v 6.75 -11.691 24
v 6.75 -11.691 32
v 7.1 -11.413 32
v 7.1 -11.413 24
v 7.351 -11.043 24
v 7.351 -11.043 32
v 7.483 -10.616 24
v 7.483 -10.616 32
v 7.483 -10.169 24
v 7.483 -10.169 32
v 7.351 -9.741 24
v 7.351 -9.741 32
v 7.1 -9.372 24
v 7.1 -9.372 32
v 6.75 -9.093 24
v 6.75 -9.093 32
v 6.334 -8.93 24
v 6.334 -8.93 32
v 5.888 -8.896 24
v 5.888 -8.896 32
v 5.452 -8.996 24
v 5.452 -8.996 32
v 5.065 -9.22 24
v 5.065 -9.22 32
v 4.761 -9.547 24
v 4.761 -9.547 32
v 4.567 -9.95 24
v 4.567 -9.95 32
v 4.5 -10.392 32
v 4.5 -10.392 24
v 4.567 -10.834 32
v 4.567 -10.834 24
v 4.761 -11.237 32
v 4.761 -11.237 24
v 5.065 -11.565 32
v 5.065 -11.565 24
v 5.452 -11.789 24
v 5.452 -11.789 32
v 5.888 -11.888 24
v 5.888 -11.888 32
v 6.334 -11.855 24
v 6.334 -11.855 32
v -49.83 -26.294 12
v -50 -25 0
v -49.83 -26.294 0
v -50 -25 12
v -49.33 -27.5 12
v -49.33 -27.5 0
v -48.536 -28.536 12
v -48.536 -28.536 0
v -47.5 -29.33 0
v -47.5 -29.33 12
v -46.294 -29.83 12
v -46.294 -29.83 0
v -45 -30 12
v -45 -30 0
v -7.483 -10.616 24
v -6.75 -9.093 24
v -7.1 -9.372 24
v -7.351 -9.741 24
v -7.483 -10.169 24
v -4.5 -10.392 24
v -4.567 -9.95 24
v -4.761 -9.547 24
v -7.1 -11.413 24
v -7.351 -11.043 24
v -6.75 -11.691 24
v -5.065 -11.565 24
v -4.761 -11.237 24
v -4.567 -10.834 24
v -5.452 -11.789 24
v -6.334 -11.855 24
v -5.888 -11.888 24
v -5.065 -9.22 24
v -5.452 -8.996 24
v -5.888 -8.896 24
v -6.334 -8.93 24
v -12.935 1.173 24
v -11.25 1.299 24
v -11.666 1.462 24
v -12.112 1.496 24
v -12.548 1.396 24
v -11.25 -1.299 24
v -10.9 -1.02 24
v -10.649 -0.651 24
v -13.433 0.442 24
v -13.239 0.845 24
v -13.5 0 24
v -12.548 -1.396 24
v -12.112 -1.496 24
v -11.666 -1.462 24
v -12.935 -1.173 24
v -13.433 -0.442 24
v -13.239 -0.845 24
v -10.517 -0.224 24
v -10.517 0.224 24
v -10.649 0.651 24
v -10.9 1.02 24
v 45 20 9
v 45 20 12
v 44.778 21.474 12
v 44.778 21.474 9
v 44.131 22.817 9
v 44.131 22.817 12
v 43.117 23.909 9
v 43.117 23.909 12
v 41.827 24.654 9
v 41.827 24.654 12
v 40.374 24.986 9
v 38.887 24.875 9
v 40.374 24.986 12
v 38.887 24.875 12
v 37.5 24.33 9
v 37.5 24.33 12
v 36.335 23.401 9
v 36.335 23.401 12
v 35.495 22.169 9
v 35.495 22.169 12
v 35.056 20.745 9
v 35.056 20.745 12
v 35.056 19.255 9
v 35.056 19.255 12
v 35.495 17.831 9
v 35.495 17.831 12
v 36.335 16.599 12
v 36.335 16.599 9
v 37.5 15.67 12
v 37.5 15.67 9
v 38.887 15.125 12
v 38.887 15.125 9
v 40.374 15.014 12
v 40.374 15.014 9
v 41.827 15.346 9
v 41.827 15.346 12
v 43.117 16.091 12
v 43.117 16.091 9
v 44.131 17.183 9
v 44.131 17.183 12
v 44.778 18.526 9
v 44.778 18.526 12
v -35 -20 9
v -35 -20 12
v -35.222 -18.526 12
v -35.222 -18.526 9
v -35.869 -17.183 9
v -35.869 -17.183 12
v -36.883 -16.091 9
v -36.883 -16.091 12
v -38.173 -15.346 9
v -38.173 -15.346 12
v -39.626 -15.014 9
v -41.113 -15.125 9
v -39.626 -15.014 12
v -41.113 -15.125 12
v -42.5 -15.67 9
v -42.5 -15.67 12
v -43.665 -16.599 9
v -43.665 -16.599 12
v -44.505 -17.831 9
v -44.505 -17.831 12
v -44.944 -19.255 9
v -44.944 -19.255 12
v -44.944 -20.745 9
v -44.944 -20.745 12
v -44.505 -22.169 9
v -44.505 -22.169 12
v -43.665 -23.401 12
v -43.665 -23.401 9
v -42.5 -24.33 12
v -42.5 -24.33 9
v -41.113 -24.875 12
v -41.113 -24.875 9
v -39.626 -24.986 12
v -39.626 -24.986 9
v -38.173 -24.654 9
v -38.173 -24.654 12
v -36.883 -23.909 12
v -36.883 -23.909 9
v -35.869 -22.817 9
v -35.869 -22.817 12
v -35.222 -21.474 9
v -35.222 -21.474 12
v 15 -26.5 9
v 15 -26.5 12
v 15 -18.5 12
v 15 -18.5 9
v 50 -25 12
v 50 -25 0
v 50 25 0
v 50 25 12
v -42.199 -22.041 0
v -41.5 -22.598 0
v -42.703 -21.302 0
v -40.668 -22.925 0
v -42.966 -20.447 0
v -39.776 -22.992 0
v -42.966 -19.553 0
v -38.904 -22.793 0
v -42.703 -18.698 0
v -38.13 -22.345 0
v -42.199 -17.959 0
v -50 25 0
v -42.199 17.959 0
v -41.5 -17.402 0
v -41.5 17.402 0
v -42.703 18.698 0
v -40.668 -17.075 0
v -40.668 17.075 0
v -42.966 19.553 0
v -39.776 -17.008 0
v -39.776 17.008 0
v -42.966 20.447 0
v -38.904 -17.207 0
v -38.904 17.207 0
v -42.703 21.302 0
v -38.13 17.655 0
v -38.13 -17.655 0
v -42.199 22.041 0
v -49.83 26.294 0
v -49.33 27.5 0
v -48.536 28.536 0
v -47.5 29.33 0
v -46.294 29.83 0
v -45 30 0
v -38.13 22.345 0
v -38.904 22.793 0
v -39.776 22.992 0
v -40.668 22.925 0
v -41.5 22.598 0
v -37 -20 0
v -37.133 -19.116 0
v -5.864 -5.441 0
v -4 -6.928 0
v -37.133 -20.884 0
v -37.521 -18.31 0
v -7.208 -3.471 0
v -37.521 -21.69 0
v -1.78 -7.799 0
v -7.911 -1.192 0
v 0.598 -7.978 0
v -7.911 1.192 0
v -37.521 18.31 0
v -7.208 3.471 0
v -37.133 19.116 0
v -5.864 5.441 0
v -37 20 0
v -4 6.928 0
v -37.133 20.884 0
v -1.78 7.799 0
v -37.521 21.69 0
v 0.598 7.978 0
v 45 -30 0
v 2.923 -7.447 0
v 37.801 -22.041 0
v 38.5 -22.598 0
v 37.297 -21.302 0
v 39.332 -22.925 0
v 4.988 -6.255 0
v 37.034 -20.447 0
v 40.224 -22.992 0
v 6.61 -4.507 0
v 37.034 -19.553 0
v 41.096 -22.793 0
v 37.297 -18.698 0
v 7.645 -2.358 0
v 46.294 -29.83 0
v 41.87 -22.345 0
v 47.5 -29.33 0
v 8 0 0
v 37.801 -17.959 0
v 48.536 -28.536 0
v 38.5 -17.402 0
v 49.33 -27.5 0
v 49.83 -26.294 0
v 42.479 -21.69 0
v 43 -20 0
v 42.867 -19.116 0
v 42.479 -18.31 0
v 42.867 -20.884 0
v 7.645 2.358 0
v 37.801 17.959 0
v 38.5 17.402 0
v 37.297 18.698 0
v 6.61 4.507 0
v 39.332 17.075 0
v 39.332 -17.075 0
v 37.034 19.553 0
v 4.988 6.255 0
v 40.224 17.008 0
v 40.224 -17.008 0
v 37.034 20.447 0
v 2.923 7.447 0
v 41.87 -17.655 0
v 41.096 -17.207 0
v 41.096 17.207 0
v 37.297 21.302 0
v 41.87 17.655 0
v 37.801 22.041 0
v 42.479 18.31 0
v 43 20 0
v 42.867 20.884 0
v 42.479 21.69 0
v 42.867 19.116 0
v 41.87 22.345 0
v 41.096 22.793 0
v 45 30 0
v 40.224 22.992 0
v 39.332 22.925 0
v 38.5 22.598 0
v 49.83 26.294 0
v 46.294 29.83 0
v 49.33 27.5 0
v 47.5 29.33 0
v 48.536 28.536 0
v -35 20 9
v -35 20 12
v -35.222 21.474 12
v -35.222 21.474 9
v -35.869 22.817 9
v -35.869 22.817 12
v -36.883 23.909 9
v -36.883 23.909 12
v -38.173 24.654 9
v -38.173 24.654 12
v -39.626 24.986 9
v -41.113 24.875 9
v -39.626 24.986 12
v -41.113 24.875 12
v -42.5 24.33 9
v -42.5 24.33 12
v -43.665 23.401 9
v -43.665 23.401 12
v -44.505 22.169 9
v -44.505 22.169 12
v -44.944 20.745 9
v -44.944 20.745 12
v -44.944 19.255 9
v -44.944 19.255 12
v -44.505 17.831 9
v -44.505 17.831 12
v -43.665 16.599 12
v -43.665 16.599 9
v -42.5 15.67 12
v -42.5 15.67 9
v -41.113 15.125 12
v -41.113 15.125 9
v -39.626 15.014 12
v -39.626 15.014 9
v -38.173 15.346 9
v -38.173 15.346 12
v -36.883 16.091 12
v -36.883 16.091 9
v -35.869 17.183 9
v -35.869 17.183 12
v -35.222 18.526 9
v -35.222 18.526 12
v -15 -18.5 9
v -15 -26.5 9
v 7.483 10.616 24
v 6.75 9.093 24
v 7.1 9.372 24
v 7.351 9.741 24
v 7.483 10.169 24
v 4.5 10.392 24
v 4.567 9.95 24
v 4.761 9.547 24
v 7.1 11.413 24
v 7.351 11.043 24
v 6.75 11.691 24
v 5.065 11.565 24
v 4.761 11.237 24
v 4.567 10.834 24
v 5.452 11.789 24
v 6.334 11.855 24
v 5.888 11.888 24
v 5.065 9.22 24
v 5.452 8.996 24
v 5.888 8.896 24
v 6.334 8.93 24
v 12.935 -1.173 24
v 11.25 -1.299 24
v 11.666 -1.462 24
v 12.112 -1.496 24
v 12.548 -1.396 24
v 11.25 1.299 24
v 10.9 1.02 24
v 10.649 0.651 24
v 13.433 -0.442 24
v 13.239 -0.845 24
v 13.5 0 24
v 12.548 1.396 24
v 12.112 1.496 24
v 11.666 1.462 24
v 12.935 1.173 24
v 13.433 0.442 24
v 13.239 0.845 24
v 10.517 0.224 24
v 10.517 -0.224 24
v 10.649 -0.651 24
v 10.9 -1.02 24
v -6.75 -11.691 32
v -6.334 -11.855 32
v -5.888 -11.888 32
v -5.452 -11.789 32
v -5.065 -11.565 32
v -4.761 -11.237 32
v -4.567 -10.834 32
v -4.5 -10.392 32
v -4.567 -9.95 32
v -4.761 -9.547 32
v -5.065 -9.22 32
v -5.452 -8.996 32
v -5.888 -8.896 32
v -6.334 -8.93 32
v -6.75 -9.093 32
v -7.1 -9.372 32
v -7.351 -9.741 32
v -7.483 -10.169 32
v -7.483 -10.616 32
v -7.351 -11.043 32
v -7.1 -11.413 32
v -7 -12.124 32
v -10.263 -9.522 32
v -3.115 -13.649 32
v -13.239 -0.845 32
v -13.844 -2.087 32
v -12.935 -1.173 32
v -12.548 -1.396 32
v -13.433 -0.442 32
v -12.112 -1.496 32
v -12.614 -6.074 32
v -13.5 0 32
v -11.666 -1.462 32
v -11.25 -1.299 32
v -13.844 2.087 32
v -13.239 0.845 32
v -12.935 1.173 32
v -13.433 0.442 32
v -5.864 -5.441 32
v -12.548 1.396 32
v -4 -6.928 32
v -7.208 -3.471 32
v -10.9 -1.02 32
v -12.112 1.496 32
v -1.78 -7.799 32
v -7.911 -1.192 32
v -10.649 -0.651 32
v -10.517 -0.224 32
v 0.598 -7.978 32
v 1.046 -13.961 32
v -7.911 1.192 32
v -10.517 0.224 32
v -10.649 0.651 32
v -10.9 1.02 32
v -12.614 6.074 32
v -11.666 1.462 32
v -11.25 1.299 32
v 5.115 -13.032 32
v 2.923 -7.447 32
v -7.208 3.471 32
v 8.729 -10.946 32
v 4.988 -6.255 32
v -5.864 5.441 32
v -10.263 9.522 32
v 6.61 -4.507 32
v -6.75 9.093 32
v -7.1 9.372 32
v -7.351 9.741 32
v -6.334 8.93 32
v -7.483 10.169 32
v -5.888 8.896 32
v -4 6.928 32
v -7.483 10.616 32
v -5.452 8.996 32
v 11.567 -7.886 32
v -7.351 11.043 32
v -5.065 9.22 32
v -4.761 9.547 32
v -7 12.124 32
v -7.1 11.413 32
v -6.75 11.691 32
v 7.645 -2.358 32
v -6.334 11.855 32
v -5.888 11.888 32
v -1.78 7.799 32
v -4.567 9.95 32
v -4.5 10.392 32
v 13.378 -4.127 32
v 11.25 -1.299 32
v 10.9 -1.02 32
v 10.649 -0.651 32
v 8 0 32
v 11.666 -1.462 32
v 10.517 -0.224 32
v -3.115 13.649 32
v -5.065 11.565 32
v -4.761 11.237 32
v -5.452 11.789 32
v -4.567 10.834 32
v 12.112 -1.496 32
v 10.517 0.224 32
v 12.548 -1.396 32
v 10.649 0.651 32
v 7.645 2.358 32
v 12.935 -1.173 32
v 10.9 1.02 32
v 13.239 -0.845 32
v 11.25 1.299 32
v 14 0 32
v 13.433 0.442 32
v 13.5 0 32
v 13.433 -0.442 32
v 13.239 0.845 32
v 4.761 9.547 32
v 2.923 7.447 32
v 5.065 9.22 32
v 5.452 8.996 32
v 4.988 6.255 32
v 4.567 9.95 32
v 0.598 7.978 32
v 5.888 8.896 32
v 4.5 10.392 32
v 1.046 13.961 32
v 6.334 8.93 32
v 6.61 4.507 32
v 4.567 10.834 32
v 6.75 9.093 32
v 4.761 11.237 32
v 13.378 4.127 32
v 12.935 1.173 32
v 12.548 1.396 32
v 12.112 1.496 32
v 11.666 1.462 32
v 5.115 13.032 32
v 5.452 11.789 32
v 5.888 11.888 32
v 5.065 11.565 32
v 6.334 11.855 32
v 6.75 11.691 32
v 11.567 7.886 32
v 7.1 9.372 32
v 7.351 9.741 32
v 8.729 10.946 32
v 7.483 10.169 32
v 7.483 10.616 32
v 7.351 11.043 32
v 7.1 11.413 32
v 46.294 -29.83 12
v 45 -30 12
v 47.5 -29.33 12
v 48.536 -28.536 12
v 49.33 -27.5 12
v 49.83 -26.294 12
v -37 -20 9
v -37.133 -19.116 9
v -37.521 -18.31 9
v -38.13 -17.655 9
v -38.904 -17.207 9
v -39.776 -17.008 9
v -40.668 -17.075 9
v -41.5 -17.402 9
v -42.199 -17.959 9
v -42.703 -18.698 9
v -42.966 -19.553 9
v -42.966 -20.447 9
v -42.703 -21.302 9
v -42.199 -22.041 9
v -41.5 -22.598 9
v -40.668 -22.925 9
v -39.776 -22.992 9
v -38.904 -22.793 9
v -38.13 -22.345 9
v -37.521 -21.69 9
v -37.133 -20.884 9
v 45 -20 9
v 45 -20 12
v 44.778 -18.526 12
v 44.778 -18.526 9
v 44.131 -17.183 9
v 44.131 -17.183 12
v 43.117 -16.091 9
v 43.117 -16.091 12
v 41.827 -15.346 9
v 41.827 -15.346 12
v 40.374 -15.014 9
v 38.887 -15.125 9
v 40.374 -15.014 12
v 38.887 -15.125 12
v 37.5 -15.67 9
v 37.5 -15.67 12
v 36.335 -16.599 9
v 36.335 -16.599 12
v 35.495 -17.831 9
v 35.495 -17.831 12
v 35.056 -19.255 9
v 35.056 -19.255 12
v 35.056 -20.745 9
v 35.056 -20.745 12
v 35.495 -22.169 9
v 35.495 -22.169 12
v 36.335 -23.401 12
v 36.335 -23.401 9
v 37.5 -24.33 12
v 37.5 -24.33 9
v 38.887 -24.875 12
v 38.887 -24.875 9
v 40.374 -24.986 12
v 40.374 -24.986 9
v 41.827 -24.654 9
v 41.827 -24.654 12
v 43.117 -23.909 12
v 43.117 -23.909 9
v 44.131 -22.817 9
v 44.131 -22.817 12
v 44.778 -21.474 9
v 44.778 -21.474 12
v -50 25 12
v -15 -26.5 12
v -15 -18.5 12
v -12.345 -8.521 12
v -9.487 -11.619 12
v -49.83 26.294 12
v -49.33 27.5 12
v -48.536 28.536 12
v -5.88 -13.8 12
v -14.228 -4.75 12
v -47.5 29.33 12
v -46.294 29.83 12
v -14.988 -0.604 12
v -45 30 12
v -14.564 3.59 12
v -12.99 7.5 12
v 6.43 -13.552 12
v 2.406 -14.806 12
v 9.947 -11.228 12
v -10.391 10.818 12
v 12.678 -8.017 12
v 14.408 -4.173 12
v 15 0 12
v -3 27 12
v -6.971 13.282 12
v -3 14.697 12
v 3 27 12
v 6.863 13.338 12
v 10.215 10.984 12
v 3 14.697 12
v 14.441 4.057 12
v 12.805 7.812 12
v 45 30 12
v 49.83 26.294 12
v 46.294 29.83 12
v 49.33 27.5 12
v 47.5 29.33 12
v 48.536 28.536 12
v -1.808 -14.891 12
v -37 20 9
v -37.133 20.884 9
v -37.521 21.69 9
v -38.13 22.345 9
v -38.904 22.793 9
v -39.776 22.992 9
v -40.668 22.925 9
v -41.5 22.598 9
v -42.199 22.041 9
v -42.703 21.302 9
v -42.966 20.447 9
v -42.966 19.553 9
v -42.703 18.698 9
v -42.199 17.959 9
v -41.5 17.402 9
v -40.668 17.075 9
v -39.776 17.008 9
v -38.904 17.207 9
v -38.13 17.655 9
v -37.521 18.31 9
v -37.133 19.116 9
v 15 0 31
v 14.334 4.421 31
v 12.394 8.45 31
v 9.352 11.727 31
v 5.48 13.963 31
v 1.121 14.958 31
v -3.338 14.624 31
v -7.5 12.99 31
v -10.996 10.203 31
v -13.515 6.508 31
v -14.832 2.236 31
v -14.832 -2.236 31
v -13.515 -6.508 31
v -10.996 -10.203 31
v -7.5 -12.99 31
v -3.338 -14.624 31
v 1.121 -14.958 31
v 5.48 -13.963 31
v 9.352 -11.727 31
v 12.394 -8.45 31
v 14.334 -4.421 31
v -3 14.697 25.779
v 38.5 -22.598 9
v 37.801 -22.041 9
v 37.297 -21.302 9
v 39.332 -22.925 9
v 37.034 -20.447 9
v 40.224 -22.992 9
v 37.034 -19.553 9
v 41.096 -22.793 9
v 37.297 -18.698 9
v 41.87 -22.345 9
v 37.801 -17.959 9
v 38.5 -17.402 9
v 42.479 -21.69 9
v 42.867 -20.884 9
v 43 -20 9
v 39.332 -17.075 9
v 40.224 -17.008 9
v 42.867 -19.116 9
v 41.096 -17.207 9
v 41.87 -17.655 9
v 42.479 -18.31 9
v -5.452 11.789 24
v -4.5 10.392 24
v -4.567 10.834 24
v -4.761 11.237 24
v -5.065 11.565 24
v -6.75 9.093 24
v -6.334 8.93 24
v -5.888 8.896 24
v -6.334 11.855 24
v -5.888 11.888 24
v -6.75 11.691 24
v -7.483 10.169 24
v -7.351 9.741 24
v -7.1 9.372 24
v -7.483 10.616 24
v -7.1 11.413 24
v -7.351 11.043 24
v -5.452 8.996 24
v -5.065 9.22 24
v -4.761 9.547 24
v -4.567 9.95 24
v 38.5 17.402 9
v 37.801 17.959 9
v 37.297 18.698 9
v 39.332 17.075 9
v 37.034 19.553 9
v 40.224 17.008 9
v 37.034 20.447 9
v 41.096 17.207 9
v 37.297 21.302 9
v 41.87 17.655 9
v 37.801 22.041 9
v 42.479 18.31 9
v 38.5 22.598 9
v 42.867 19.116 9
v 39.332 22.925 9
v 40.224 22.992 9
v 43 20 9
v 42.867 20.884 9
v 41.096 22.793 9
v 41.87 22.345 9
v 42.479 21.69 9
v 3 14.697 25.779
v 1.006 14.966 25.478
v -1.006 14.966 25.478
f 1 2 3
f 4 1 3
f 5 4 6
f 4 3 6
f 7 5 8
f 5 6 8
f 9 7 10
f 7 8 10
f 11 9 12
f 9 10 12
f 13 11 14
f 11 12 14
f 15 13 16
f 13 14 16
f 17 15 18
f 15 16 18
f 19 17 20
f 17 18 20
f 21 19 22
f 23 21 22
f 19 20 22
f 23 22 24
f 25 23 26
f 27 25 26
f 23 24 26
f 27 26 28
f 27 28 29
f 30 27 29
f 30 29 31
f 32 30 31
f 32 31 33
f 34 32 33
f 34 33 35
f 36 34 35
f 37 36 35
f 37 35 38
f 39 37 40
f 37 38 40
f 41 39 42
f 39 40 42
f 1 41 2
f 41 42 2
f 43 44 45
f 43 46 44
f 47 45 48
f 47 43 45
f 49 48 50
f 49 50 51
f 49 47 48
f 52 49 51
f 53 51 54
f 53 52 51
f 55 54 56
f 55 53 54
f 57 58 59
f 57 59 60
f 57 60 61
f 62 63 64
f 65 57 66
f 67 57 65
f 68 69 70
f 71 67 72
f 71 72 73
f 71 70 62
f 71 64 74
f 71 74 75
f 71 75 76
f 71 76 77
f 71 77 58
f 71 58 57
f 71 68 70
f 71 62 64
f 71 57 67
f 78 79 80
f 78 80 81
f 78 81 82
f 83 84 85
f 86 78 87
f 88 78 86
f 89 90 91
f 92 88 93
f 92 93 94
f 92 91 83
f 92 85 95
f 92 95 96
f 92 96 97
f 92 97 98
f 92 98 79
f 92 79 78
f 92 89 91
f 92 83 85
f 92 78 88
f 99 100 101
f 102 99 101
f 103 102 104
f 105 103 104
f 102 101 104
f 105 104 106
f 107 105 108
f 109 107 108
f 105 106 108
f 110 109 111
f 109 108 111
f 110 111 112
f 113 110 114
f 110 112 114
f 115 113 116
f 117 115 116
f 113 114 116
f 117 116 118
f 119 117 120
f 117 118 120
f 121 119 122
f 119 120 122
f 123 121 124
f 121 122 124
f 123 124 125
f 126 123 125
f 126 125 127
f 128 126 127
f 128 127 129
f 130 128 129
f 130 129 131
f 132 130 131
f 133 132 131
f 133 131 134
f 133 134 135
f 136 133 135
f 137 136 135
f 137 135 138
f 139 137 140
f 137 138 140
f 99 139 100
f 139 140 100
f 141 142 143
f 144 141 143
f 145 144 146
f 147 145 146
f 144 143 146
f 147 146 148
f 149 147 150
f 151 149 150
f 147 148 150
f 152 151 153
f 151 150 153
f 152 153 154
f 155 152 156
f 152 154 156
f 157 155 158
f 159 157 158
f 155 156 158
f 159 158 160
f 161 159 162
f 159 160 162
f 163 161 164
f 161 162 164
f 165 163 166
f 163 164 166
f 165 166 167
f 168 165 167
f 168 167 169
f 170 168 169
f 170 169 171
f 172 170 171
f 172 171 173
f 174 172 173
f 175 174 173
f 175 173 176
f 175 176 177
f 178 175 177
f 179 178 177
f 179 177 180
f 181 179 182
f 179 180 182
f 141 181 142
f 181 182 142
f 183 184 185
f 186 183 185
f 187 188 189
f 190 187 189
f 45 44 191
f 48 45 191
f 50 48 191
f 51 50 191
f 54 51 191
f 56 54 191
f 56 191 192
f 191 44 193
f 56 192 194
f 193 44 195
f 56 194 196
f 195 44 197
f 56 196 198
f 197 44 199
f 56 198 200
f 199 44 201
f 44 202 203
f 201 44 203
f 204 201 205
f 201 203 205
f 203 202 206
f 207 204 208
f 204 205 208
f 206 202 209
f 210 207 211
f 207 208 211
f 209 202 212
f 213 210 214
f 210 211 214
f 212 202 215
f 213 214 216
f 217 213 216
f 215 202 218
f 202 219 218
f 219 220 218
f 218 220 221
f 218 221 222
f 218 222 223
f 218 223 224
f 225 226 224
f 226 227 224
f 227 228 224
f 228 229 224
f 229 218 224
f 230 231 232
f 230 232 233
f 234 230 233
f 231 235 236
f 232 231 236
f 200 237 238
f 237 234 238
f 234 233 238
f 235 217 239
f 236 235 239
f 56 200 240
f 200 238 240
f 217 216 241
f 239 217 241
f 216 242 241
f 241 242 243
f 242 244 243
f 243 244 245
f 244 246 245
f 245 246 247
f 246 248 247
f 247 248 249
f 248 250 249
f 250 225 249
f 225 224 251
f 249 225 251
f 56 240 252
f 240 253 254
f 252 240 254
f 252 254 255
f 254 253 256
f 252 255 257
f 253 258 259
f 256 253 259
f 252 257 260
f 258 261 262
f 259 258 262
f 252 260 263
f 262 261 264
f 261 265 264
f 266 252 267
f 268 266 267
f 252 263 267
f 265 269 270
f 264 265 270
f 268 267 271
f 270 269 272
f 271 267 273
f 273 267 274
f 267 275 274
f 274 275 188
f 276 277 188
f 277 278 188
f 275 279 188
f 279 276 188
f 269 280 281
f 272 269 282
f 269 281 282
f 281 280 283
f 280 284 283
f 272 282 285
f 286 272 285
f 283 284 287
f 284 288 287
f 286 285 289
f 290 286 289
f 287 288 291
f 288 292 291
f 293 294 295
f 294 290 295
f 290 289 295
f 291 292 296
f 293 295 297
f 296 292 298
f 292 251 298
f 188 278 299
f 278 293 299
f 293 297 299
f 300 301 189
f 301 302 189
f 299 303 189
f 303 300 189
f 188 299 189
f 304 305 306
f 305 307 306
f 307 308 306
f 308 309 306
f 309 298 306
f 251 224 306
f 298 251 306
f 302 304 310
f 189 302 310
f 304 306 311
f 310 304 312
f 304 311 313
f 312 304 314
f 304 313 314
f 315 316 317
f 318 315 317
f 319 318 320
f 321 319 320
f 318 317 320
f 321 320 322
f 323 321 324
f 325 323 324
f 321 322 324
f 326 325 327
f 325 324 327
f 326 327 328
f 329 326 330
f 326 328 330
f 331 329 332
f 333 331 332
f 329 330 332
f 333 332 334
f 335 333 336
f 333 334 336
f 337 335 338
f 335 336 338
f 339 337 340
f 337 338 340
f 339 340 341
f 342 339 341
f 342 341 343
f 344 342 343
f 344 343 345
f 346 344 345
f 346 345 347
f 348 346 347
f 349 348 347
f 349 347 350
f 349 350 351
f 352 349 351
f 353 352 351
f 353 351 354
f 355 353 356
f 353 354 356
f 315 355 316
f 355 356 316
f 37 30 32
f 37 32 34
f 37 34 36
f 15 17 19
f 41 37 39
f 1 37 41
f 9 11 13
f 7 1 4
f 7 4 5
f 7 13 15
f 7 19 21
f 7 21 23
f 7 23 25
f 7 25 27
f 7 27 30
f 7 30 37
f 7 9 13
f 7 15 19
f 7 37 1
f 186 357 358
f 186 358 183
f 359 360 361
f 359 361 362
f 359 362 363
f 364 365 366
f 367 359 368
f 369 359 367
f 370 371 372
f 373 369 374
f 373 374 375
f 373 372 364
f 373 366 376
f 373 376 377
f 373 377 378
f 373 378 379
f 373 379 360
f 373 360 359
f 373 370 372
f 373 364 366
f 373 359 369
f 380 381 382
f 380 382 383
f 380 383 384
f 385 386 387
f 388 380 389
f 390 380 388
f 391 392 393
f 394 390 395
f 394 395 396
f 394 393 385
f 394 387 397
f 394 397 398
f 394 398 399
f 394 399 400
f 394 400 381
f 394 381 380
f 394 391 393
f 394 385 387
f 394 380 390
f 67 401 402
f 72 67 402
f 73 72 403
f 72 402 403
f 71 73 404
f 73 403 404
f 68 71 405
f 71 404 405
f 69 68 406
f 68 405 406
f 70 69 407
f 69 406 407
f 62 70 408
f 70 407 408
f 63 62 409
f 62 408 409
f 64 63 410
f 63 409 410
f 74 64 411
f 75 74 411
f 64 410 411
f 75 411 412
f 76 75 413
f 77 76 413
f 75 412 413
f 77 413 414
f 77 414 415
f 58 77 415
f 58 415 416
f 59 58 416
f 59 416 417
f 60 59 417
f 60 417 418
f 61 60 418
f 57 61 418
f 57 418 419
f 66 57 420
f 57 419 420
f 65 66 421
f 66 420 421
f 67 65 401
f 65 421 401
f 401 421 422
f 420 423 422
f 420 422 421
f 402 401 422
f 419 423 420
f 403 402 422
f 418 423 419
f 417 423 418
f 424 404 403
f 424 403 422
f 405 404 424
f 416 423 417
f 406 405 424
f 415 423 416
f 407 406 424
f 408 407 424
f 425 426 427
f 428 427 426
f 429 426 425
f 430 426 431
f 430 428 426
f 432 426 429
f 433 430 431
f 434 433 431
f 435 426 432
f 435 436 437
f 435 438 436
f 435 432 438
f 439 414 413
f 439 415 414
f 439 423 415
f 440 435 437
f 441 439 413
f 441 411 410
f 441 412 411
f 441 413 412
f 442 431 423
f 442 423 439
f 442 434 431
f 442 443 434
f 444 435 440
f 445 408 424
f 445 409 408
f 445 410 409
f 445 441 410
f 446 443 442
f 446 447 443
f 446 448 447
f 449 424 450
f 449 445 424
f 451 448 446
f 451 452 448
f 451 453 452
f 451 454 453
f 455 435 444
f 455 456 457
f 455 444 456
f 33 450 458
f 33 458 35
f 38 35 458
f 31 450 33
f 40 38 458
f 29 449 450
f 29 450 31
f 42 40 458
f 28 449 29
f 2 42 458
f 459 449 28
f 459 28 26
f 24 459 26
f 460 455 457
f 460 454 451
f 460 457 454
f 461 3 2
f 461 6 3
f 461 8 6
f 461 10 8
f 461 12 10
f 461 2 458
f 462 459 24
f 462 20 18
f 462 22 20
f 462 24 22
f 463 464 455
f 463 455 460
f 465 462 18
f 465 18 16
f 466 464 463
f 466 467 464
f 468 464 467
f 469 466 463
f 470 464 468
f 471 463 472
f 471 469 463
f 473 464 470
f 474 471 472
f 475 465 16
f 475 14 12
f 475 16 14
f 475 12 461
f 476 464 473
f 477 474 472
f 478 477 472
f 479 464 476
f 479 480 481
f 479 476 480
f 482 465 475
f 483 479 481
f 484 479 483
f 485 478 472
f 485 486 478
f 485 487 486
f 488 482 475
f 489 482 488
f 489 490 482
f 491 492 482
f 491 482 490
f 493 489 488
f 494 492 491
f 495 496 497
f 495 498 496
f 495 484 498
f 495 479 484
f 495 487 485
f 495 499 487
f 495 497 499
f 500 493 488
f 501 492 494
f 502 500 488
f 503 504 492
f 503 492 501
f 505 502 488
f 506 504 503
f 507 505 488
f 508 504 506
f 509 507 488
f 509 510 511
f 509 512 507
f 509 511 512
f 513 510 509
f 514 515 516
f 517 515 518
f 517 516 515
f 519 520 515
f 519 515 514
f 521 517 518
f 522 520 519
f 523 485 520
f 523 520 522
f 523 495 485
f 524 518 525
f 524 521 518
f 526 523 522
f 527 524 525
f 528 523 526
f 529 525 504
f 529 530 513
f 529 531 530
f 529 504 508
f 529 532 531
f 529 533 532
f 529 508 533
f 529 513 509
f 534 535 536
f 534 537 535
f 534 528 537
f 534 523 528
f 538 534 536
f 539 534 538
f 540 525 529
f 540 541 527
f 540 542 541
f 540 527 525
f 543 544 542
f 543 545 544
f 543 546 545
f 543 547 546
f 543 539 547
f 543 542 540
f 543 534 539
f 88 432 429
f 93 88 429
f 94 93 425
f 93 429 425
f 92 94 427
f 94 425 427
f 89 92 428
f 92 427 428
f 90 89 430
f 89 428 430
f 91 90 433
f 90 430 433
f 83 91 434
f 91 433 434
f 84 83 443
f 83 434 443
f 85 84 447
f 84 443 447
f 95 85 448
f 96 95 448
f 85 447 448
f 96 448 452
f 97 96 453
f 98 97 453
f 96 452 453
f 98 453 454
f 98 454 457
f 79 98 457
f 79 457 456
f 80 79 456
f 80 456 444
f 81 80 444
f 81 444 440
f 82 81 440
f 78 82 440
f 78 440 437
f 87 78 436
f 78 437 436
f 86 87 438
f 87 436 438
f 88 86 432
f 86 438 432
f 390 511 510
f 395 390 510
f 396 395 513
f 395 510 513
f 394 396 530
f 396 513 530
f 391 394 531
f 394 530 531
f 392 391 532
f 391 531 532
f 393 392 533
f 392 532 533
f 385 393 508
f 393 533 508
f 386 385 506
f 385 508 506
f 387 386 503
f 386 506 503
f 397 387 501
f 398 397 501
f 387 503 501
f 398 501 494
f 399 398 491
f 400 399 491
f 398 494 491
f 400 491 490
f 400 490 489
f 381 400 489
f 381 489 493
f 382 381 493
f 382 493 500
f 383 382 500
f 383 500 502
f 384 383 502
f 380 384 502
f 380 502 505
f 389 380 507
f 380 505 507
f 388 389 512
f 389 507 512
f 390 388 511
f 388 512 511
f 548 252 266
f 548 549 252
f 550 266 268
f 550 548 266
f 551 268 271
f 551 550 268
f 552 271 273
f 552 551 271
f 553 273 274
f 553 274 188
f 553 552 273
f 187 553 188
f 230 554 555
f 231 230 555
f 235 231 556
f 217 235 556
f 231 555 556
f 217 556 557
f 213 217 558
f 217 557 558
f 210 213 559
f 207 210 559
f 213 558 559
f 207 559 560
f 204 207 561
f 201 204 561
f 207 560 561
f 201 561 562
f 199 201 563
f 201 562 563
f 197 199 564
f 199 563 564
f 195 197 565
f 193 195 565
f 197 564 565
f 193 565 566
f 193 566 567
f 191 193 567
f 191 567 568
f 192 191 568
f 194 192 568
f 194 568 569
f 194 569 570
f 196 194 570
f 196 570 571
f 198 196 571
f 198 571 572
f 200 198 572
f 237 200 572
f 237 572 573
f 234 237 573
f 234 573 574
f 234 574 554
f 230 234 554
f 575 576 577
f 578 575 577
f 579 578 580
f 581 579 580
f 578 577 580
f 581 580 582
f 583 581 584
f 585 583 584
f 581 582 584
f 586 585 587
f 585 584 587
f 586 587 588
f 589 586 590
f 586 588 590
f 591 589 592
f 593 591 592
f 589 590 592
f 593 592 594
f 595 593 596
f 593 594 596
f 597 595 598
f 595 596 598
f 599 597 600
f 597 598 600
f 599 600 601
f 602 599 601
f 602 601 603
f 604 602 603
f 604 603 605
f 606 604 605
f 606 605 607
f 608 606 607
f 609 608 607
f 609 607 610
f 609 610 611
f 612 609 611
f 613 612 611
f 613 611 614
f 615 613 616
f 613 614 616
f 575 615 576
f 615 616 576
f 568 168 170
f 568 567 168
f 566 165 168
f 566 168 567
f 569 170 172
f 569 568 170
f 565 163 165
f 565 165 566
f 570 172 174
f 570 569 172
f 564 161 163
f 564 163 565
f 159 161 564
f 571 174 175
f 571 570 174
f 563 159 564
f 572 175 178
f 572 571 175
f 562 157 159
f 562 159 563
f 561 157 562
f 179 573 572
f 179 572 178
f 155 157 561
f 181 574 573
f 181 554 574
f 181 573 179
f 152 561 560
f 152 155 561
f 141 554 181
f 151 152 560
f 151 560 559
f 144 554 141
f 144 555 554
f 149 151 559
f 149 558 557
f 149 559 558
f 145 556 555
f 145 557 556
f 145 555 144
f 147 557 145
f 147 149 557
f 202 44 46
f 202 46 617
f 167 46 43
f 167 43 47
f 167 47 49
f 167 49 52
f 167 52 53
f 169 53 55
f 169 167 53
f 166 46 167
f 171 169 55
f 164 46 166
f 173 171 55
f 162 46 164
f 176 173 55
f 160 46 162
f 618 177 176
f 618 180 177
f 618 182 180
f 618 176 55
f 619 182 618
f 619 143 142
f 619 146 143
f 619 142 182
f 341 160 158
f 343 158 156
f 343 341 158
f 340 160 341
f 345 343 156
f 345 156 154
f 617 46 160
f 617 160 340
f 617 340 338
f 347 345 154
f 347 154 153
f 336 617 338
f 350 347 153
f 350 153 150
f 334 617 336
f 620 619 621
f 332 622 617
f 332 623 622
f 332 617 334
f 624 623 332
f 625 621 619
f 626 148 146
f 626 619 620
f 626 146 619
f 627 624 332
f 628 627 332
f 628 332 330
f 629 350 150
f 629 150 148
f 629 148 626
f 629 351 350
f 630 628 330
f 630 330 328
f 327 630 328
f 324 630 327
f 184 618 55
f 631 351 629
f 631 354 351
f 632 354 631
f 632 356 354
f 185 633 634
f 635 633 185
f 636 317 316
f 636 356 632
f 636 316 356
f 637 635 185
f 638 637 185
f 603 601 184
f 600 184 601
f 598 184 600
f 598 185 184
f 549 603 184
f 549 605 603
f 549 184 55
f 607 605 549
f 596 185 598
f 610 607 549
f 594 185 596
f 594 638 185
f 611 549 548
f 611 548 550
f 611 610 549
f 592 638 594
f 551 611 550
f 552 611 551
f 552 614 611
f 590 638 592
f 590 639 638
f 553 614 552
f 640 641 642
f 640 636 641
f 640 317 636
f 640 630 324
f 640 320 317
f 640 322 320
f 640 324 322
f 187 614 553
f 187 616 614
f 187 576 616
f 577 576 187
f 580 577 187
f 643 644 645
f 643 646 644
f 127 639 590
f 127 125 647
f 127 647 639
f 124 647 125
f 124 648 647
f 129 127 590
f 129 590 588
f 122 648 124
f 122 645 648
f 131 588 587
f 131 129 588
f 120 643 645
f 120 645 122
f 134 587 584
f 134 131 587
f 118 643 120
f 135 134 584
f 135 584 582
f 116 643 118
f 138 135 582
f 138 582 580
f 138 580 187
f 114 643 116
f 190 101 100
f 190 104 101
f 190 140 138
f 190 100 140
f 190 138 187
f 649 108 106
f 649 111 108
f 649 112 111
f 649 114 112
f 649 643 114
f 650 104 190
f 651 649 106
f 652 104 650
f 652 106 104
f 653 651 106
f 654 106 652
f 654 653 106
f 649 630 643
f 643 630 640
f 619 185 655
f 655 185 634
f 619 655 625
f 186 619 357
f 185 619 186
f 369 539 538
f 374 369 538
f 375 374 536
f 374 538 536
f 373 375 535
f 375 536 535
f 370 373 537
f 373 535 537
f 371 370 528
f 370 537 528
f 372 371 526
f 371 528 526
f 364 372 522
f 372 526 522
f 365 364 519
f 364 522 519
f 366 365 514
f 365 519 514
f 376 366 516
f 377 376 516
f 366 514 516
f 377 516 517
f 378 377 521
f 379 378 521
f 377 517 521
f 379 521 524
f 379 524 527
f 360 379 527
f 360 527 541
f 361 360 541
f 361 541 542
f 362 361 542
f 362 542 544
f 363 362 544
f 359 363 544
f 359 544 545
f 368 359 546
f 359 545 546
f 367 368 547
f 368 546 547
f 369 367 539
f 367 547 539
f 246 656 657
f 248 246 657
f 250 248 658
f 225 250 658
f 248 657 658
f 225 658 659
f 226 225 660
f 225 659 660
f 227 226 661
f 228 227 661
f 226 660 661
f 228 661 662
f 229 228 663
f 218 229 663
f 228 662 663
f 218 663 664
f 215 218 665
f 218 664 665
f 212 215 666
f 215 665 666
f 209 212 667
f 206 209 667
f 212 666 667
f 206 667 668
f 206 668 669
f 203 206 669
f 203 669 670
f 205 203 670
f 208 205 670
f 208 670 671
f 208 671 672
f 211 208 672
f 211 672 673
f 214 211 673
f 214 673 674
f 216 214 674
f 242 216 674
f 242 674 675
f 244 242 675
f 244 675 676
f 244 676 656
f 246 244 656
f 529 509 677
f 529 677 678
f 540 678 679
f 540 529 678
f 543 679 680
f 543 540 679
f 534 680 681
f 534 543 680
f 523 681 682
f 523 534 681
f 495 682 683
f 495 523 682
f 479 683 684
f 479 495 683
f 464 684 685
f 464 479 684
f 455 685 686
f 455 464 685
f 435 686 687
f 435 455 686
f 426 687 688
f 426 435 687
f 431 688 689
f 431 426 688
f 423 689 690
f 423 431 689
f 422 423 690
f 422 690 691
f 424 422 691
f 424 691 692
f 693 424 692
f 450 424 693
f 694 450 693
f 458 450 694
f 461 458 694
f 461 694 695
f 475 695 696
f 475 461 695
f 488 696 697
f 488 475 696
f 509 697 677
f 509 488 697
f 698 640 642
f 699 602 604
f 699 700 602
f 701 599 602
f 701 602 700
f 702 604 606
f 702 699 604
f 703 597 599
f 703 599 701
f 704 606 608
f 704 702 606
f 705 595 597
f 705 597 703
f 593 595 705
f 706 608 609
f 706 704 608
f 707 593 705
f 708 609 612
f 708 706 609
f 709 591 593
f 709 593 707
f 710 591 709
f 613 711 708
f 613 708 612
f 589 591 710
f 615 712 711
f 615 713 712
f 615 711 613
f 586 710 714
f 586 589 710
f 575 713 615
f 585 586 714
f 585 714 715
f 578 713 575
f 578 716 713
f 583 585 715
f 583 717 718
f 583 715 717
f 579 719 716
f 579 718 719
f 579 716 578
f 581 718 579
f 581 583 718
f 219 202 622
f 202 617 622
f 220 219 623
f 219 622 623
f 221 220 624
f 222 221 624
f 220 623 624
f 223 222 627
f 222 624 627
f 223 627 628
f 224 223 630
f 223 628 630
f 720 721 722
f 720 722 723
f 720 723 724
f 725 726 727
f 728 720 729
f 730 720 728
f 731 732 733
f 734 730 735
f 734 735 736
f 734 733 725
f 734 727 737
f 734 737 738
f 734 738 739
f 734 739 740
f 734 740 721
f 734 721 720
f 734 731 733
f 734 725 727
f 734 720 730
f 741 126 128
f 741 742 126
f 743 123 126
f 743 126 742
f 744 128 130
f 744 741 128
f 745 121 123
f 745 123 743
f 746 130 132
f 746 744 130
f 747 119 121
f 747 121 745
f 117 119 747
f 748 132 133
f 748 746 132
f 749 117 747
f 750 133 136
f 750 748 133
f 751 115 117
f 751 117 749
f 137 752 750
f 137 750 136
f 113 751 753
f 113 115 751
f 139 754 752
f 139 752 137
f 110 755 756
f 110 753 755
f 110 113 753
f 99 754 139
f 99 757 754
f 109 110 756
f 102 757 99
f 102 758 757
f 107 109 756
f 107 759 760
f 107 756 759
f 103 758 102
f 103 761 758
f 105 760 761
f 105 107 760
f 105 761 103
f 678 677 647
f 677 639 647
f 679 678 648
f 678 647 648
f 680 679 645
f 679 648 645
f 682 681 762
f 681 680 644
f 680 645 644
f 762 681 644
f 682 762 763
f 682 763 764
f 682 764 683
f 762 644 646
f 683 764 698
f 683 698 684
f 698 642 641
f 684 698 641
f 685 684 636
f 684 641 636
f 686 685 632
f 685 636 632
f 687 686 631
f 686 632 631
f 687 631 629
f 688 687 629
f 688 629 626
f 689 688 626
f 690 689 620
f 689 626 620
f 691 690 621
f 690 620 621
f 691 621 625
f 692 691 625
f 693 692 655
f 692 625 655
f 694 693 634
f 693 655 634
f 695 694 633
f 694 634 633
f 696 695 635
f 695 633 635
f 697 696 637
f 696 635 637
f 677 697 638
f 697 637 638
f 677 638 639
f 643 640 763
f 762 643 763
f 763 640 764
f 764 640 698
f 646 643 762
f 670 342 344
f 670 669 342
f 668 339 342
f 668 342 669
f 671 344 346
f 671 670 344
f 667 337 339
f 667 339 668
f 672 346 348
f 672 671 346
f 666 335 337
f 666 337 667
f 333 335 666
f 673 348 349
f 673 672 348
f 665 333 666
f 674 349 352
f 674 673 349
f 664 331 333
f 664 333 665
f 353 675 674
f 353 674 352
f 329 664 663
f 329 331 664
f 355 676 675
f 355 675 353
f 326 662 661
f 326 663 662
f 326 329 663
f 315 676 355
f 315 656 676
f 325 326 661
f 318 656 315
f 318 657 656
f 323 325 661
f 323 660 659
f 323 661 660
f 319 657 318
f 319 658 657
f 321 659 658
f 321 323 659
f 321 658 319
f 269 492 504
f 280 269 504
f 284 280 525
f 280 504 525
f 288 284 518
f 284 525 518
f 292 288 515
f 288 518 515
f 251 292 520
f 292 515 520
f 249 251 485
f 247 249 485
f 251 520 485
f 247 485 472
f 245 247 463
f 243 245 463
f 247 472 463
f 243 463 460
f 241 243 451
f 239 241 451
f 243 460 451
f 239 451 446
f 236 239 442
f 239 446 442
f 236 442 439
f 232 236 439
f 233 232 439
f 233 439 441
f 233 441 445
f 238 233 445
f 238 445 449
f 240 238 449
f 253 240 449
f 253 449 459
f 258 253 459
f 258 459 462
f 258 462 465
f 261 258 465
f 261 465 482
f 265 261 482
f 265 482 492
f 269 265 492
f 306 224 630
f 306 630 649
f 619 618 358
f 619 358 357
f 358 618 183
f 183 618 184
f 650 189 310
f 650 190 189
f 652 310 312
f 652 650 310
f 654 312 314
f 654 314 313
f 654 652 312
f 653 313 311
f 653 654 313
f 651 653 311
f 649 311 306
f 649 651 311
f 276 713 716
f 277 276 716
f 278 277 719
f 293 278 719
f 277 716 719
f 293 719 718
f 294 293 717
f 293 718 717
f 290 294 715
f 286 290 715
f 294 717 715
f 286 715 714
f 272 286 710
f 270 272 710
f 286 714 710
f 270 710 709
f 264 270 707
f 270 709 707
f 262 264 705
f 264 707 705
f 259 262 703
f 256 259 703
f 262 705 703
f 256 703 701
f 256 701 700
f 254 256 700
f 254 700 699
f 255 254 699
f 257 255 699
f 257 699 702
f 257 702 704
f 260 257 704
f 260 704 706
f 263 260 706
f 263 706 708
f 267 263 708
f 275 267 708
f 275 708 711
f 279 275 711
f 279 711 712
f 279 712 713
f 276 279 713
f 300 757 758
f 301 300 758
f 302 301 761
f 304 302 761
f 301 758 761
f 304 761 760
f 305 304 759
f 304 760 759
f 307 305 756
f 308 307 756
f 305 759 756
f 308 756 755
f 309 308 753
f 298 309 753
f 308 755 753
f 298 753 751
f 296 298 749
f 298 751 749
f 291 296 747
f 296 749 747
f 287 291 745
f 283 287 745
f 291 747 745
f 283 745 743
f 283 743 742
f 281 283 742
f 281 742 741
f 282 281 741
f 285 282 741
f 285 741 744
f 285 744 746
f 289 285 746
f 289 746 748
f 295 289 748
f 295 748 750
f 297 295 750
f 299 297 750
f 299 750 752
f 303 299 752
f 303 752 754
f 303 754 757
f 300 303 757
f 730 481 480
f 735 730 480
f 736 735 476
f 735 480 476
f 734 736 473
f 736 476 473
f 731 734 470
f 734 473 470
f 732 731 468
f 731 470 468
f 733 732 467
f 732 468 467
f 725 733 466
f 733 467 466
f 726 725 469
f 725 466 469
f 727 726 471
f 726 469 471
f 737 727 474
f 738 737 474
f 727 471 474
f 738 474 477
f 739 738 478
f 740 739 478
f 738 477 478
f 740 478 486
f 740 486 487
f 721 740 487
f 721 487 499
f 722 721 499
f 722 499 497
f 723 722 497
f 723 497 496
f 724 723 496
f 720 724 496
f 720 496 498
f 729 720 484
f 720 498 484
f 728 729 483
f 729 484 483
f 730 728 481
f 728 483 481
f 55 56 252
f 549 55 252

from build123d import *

# Parameters (mm, degrees)
SKETCH1_W           = 100
SKETCH1_H           = 60
BOSS_EXTRUDE1_DEPTH = 12
FILLET1_R           = 5
SKETCH2_R           = 15
BOSS_EXTRUDE2_DEPTH = 20
CHAMFER1_SIZE       = 1
SKETCH3_R           = 8
CUT_EXTRUDE2_DEPTH  = 67.513156593
SKETCH4_R           = 5
CUT_EXTRUDE4_DEPTH  = 3
SKETCH5_R           = 3
CUT_EXTRUDE6_DEPTH  = 62.64414003
SKETCH6_W           = 30
SKETCH6_H           = 8
CUT_EXTRUDE8_DEPTH  = 3
SKETCH7_R           = 1.5
CUT_EXTRUDE10_DEPTH = 8
CIRPATTERN1_COUNT   = 6
RIB2_REACH          = 68.513
SKETCH8_2_WALL_W    = 153.794637566
SKETCH8_2_WALL_H    = 6


with BuildPart() as part:
    # Sketch1 → Boss-Extrude1 (new body)
    with BuildSketch(Plane.XY):
        Rectangle(SKETCH1_W, SKETCH1_H)
    extrude(amount=BOSS_EXTRUDE1_DEPTH)

    # Fillet1
    fillet1_edges = [part.edges().sort_by_distance(p)[0] for p in [
        (-50, 30, 6),
        (50, 30, 6),
        (50, -30, 6),
        (-50, -30, 6),
    ]]
    fillet(fillet1_edges, radius=FILLET1_R)

    # Sketch2 → Boss-Extrude2 (add)
    with BuildSketch(Plane.XY.offset(12)):
        Circle(SKETCH2_R)
    extrude(amount=BOSS_EXTRUDE2_DEPTH)

    # Chamfer1
    chamfer1_edges = [part.edges().sort_by_distance(p)[0] for p in [
        (-15, 0, 32),
    ]]
    chamfer(chamfer1_edges, length=CHAMFER1_SIZE)

    # Sketch3 → Cut-Extrude2 (cut, through all)
    with BuildSketch(Plane.XY.offset(32)):
        Circle(SKETCH3_R)
    extrude(amount=-CUT_EXTRUDE2_DEPTH, mode=Mode.SUBTRACT)

    # Sketch4 → Cut-Extrude4 (cut)
    with BuildSketch(Plane.XY.offset(12)):
        with Locations((-40, -20)):
            Circle(SKETCH4_R)
        with Locations((-40, 20)):
            Circle(SKETCH4_R)
        with Locations((40, -20)):
            Circle(SKETCH4_R)
        with Locations((40, 20)):
            Circle(SKETCH4_R)
    extrude(amount=-CUT_EXTRUDE4_DEPTH, mode=Mode.SUBTRACT)

    # Sketch5 → Cut-Extrude6 (cut, through all)
    with BuildSketch(Plane.XY.offset(12)):
        with Locations((-40, -20)):
            Circle(SKETCH5_R)
        with Locations((-40, 20)):
            Circle(SKETCH5_R)
        with Locations((40, -20)):
            Circle(SKETCH5_R)
        with Locations((40, 20)):
            Circle(SKETCH5_R)
    extrude(amount=-CUT_EXTRUDE6_DEPTH, mode=Mode.SUBTRACT)

    # Sketch6 → Cut-Extrude8 (cut)
    with BuildSketch(Plane.XY.offset(12)):
        with Locations((0, -22.5)):
            Rectangle(SKETCH6_W, SKETCH6_H)
    extrude(amount=-CUT_EXTRUDE8_DEPTH, mode=Mode.SUBTRACT)

    # Sketch7 → Cut-Extrude10 (cut)
    with BuildSketch(Plane.XY.offset(32)):
        with Locations((12, 0)):
            Circle(SKETCH7_R)
    cut_extrude10 = extrude(amount=-CUT_EXTRUDE10_DEPTH, mode=Mode.SUBTRACT)

    # CirPattern1: Cut-Extrude10 ×6 about axis
    cirpattern1_axis = Axis((0, 0, -1.6), (0, 0, 1))
    for i in range(1, CIRPATTERN1_COUNT):
        add(cut_extrude10.rotate(cirpattern1_axis, i * 360 / CIRPATTERN1_COUNT), mode=Mode.SUBTRACT)

    # Sketch8<2> wall → Rib2 (add, up to next)
    with BuildSketch(Plane(origin=(0, 20.75, 19), x_dir=(0, -0.666015769309, 0.745937661626), z_dir=(0, -0.745937661626, -0.666015769309)), mode=Mode.PRIVATE) as rib2_sk1:
        Rectangle(SKETCH8_2_WALL_W, SKETCH8_2_WALL_H)
    rib2_tool1 = extrude(rib2_sk1.sketch, amount=RIB2_REACH, mode=Mode.PRIVATE) - part.part
    add(rib2_tool1.solids().sort_by_distance((0, 20.75, 19))[0])


solid = part.part
